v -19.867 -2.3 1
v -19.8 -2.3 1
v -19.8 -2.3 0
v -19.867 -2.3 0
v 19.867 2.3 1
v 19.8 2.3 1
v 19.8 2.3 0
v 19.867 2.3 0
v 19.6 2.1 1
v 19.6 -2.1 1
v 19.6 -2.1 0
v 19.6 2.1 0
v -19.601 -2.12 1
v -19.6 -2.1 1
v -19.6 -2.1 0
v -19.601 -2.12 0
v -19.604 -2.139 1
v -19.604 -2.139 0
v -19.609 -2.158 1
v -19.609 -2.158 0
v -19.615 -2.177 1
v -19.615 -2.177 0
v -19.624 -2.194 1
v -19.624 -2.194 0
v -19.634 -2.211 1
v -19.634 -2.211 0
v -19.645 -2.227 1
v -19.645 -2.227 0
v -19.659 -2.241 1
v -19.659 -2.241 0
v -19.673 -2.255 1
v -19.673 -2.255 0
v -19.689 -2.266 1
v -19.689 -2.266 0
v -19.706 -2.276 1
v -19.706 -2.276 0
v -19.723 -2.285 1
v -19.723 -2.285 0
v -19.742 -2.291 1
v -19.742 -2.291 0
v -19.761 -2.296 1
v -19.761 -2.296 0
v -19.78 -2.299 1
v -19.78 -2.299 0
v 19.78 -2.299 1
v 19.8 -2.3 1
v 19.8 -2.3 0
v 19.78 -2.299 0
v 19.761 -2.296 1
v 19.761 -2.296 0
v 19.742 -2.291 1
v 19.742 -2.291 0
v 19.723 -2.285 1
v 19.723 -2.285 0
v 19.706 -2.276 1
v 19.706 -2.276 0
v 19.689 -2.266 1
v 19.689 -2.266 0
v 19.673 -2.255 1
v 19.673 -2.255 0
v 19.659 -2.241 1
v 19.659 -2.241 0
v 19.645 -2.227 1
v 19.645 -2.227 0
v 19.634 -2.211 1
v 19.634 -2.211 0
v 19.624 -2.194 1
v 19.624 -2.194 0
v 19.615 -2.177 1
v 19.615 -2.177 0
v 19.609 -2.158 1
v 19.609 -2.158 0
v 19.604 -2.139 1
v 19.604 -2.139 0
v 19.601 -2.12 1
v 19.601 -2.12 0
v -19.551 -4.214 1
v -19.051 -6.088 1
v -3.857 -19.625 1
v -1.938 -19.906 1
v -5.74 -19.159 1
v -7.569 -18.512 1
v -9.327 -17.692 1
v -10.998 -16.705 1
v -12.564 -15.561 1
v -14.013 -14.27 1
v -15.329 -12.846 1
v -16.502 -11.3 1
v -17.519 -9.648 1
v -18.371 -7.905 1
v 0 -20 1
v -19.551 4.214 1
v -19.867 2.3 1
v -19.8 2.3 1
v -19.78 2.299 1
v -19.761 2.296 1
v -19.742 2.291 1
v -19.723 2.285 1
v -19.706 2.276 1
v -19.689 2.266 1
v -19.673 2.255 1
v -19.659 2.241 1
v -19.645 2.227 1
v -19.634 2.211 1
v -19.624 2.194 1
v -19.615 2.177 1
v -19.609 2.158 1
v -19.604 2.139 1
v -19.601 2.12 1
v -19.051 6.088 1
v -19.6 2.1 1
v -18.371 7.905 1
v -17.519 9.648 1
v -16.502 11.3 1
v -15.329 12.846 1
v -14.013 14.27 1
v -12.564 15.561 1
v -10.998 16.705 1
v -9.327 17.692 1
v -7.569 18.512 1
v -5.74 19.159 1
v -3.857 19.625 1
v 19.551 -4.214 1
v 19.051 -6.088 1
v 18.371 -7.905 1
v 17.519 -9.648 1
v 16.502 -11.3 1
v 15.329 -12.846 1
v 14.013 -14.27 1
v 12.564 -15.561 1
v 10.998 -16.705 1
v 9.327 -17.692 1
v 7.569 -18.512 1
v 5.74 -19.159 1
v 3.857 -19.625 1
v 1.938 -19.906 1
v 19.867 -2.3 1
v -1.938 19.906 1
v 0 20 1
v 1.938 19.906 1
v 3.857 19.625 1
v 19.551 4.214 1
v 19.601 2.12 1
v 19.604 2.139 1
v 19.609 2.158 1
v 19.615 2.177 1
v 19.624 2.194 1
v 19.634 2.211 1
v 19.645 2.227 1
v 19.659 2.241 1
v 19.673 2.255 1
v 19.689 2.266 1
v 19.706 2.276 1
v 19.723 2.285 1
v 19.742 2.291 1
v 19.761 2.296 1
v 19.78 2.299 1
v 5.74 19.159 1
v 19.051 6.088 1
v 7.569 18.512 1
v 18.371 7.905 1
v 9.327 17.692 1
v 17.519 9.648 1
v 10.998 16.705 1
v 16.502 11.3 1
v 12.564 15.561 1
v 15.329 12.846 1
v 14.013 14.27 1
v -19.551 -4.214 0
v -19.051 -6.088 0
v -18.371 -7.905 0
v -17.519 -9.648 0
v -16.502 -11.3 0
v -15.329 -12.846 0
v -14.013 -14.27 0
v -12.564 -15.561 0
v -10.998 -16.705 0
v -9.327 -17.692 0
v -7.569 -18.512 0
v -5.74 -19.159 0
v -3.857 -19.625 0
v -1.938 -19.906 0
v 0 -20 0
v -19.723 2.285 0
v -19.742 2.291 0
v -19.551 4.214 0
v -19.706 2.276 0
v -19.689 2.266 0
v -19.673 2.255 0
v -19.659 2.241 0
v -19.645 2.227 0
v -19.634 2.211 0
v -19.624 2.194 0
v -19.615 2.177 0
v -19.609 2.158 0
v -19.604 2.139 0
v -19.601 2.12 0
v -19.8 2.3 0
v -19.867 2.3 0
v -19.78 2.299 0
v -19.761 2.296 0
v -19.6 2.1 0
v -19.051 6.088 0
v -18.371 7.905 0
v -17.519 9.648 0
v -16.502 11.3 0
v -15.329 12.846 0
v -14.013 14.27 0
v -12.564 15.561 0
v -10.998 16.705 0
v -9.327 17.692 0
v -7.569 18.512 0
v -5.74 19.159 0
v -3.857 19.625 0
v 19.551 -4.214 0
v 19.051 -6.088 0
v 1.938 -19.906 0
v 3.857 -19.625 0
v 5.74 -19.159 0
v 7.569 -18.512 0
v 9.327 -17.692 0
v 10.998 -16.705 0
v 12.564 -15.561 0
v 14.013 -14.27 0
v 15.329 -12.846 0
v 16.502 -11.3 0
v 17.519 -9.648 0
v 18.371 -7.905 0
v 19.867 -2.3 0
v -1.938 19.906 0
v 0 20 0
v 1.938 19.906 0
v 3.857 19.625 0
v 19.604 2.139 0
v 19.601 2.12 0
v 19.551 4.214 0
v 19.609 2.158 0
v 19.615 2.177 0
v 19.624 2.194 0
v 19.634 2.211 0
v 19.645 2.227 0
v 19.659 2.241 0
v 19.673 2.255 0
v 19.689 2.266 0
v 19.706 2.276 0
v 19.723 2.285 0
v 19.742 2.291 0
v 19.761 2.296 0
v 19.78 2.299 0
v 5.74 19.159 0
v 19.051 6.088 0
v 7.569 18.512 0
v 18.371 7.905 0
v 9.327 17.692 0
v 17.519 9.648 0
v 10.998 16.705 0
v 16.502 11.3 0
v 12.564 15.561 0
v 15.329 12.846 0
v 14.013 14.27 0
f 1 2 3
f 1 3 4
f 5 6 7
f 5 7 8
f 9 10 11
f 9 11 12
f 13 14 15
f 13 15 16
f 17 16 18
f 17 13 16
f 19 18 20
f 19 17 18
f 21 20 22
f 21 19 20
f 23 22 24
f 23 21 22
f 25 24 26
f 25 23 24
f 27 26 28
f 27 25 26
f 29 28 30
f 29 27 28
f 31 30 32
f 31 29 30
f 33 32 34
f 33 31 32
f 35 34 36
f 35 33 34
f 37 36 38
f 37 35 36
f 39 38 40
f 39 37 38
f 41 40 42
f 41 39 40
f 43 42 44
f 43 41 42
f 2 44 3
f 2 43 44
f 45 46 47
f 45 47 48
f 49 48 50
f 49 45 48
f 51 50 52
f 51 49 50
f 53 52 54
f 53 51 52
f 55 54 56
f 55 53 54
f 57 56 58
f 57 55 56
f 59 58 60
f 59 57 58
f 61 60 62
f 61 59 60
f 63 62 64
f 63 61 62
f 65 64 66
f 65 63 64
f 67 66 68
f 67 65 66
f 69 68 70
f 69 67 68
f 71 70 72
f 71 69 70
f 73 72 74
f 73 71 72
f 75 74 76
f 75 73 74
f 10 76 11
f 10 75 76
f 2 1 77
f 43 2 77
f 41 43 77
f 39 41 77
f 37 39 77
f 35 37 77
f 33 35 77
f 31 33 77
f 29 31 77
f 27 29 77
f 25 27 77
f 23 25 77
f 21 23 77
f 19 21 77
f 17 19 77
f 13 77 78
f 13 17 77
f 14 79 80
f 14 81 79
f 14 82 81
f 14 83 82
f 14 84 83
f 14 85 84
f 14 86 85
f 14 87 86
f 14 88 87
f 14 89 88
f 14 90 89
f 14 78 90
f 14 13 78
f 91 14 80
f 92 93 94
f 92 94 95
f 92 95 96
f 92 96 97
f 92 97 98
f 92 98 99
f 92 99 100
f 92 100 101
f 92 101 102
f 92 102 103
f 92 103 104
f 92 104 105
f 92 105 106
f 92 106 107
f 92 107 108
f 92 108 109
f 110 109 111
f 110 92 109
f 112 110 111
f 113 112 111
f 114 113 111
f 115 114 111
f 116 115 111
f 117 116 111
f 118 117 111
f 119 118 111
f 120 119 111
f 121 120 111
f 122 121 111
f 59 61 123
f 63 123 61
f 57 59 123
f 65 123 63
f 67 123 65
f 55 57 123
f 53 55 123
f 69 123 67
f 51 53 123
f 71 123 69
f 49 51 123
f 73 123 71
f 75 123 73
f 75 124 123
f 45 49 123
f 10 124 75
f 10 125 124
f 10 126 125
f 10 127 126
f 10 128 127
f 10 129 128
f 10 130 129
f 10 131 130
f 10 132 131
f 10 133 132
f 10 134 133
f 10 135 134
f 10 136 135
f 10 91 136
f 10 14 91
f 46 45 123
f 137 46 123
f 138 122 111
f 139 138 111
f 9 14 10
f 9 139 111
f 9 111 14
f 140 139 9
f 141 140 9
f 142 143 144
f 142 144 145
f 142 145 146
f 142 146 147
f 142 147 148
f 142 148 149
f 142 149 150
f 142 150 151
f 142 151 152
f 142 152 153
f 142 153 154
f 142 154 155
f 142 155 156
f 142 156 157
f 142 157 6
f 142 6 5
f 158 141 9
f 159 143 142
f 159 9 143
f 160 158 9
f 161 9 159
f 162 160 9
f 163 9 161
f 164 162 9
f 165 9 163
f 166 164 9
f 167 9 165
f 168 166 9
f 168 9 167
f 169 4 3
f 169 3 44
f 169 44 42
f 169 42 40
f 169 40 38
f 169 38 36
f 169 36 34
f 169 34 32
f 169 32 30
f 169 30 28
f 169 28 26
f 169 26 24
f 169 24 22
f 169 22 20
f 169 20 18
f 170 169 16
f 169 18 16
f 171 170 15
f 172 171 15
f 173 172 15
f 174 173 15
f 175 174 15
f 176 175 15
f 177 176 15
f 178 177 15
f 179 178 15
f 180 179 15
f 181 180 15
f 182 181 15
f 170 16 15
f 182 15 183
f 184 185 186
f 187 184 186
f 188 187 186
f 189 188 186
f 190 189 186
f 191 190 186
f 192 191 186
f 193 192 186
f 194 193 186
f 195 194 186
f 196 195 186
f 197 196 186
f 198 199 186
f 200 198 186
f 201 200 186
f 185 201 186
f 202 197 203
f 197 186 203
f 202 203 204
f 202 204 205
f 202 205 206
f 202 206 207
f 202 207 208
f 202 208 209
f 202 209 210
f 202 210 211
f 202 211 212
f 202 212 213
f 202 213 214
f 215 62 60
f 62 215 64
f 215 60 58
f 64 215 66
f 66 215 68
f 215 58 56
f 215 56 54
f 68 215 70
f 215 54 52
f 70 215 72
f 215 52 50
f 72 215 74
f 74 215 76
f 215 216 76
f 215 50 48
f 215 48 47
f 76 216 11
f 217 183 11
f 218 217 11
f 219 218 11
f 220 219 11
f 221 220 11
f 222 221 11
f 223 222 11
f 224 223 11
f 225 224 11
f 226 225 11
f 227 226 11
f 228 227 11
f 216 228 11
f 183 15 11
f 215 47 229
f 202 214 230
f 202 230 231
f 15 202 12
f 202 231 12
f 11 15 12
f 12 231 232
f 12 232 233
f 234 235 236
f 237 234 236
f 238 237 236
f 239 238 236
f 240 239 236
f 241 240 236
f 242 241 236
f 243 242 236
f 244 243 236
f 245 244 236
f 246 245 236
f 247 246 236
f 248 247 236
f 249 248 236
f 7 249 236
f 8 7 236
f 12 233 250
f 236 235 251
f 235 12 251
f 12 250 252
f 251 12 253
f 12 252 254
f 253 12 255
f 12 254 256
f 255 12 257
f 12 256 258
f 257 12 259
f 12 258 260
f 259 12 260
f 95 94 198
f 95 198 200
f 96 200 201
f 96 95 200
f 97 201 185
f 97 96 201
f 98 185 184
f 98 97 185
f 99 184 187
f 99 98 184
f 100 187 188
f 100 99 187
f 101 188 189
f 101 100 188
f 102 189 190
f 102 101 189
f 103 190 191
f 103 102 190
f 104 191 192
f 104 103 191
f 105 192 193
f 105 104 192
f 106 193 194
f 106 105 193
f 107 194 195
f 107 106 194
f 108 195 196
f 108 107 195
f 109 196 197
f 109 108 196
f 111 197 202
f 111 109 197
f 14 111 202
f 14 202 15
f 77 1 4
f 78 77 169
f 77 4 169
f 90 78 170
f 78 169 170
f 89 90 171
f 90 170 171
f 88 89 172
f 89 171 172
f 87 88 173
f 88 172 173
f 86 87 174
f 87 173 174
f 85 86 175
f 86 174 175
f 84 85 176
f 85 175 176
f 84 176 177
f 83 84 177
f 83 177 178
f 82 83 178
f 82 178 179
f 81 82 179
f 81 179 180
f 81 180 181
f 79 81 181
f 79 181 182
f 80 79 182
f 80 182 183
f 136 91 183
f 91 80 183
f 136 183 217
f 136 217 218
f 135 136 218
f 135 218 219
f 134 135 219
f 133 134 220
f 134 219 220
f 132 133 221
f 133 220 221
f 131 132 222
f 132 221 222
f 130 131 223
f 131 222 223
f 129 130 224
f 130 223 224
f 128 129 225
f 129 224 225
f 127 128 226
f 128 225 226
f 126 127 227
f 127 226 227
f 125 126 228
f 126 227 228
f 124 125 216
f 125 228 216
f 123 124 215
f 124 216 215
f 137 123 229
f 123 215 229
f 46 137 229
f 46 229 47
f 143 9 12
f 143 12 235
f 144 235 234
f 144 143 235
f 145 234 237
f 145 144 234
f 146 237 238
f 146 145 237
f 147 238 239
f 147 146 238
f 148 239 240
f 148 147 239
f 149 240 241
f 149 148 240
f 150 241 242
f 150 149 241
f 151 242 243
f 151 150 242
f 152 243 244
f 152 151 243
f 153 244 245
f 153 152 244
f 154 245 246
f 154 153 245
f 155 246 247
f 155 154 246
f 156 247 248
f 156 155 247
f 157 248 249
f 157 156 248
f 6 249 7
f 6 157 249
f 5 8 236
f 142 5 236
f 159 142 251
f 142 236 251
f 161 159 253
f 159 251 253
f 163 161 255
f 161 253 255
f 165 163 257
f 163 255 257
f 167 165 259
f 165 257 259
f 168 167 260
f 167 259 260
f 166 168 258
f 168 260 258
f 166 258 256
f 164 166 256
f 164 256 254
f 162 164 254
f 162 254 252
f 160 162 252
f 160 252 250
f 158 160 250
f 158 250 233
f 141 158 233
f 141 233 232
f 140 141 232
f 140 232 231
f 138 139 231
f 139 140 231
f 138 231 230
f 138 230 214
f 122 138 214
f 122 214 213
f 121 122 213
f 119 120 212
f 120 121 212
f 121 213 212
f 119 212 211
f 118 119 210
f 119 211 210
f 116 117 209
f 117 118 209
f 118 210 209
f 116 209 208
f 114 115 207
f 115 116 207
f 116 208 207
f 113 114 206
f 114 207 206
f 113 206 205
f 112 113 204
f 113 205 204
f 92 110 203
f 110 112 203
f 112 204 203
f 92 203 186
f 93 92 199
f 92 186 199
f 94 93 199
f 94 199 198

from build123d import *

# Parameters (mm, degrees)
SKETCH1_R           = 20
BOSS_EXTRUDE1_DEPTH = 1
CUT_EXTRUDE1_REACH  = 30.302
CIRPATTERN1_COUNT   = 2


with BuildPart() as part:
    # Sketch1 → Boss-Extrude1 (new body)
    with BuildSketch(Plane.XY):
        Circle(SKETCH1_R)
    extrude(amount=BOSS_EXTRUDE1_DEPTH)

    # Sketch2 → Cut-Extrude1 (cut, up to next)
    with BuildSketch(Plane.XY.offset(1), mode=Mode.PRIVATE) as cut_extrude1_sk1:
        with BuildLine():
            Line((-19.867309833, 2.3), (-19.8, 2.3))
            ThreePointArc((-19.8, 2.3), (-19.658578644, 2.241421356), (-19.6, 2.1))
            Line((-19.6, 2.1), (-19.6, -2.1))
            ThreePointArc((-19.6, -2.1), (-19.658578644, -2.241421356), (-19.8, -2.3))
            Line((-19.8, -2.3), (-19.867309833, -2.3))
            ThreePointArc((-19.867309833, -2.3), (-20, 0), (-19.867309833, 2.3))
        make_face()
    cut_extrude1_tool1 = extrude(cut_extrude1_sk1.sketch, amount=-CUT_EXTRUDE1_REACH, mode=Mode.PRIVATE) & part.part
    cut_extrude1 = cut_extrude1_tool1.solids().sort_by_distance((-19.781547, 0, 1))[0]
    add(cut_extrude1, mode=Mode.SUBTRACT)

    # CirPattern1: Cut-Extrude1 ×2 about axis
    cirpattern1_axis = Axis((0, 0, 1), (0, 0, 1))
    for i in range(1, CIRPATTERN1_COUNT):
        add(cut_extrude1.rotate(cirpattern1_axis, i * 360 / CIRPATTERN1_COUNT), mode=Mode.SUBTRACT)


solid = part.part
